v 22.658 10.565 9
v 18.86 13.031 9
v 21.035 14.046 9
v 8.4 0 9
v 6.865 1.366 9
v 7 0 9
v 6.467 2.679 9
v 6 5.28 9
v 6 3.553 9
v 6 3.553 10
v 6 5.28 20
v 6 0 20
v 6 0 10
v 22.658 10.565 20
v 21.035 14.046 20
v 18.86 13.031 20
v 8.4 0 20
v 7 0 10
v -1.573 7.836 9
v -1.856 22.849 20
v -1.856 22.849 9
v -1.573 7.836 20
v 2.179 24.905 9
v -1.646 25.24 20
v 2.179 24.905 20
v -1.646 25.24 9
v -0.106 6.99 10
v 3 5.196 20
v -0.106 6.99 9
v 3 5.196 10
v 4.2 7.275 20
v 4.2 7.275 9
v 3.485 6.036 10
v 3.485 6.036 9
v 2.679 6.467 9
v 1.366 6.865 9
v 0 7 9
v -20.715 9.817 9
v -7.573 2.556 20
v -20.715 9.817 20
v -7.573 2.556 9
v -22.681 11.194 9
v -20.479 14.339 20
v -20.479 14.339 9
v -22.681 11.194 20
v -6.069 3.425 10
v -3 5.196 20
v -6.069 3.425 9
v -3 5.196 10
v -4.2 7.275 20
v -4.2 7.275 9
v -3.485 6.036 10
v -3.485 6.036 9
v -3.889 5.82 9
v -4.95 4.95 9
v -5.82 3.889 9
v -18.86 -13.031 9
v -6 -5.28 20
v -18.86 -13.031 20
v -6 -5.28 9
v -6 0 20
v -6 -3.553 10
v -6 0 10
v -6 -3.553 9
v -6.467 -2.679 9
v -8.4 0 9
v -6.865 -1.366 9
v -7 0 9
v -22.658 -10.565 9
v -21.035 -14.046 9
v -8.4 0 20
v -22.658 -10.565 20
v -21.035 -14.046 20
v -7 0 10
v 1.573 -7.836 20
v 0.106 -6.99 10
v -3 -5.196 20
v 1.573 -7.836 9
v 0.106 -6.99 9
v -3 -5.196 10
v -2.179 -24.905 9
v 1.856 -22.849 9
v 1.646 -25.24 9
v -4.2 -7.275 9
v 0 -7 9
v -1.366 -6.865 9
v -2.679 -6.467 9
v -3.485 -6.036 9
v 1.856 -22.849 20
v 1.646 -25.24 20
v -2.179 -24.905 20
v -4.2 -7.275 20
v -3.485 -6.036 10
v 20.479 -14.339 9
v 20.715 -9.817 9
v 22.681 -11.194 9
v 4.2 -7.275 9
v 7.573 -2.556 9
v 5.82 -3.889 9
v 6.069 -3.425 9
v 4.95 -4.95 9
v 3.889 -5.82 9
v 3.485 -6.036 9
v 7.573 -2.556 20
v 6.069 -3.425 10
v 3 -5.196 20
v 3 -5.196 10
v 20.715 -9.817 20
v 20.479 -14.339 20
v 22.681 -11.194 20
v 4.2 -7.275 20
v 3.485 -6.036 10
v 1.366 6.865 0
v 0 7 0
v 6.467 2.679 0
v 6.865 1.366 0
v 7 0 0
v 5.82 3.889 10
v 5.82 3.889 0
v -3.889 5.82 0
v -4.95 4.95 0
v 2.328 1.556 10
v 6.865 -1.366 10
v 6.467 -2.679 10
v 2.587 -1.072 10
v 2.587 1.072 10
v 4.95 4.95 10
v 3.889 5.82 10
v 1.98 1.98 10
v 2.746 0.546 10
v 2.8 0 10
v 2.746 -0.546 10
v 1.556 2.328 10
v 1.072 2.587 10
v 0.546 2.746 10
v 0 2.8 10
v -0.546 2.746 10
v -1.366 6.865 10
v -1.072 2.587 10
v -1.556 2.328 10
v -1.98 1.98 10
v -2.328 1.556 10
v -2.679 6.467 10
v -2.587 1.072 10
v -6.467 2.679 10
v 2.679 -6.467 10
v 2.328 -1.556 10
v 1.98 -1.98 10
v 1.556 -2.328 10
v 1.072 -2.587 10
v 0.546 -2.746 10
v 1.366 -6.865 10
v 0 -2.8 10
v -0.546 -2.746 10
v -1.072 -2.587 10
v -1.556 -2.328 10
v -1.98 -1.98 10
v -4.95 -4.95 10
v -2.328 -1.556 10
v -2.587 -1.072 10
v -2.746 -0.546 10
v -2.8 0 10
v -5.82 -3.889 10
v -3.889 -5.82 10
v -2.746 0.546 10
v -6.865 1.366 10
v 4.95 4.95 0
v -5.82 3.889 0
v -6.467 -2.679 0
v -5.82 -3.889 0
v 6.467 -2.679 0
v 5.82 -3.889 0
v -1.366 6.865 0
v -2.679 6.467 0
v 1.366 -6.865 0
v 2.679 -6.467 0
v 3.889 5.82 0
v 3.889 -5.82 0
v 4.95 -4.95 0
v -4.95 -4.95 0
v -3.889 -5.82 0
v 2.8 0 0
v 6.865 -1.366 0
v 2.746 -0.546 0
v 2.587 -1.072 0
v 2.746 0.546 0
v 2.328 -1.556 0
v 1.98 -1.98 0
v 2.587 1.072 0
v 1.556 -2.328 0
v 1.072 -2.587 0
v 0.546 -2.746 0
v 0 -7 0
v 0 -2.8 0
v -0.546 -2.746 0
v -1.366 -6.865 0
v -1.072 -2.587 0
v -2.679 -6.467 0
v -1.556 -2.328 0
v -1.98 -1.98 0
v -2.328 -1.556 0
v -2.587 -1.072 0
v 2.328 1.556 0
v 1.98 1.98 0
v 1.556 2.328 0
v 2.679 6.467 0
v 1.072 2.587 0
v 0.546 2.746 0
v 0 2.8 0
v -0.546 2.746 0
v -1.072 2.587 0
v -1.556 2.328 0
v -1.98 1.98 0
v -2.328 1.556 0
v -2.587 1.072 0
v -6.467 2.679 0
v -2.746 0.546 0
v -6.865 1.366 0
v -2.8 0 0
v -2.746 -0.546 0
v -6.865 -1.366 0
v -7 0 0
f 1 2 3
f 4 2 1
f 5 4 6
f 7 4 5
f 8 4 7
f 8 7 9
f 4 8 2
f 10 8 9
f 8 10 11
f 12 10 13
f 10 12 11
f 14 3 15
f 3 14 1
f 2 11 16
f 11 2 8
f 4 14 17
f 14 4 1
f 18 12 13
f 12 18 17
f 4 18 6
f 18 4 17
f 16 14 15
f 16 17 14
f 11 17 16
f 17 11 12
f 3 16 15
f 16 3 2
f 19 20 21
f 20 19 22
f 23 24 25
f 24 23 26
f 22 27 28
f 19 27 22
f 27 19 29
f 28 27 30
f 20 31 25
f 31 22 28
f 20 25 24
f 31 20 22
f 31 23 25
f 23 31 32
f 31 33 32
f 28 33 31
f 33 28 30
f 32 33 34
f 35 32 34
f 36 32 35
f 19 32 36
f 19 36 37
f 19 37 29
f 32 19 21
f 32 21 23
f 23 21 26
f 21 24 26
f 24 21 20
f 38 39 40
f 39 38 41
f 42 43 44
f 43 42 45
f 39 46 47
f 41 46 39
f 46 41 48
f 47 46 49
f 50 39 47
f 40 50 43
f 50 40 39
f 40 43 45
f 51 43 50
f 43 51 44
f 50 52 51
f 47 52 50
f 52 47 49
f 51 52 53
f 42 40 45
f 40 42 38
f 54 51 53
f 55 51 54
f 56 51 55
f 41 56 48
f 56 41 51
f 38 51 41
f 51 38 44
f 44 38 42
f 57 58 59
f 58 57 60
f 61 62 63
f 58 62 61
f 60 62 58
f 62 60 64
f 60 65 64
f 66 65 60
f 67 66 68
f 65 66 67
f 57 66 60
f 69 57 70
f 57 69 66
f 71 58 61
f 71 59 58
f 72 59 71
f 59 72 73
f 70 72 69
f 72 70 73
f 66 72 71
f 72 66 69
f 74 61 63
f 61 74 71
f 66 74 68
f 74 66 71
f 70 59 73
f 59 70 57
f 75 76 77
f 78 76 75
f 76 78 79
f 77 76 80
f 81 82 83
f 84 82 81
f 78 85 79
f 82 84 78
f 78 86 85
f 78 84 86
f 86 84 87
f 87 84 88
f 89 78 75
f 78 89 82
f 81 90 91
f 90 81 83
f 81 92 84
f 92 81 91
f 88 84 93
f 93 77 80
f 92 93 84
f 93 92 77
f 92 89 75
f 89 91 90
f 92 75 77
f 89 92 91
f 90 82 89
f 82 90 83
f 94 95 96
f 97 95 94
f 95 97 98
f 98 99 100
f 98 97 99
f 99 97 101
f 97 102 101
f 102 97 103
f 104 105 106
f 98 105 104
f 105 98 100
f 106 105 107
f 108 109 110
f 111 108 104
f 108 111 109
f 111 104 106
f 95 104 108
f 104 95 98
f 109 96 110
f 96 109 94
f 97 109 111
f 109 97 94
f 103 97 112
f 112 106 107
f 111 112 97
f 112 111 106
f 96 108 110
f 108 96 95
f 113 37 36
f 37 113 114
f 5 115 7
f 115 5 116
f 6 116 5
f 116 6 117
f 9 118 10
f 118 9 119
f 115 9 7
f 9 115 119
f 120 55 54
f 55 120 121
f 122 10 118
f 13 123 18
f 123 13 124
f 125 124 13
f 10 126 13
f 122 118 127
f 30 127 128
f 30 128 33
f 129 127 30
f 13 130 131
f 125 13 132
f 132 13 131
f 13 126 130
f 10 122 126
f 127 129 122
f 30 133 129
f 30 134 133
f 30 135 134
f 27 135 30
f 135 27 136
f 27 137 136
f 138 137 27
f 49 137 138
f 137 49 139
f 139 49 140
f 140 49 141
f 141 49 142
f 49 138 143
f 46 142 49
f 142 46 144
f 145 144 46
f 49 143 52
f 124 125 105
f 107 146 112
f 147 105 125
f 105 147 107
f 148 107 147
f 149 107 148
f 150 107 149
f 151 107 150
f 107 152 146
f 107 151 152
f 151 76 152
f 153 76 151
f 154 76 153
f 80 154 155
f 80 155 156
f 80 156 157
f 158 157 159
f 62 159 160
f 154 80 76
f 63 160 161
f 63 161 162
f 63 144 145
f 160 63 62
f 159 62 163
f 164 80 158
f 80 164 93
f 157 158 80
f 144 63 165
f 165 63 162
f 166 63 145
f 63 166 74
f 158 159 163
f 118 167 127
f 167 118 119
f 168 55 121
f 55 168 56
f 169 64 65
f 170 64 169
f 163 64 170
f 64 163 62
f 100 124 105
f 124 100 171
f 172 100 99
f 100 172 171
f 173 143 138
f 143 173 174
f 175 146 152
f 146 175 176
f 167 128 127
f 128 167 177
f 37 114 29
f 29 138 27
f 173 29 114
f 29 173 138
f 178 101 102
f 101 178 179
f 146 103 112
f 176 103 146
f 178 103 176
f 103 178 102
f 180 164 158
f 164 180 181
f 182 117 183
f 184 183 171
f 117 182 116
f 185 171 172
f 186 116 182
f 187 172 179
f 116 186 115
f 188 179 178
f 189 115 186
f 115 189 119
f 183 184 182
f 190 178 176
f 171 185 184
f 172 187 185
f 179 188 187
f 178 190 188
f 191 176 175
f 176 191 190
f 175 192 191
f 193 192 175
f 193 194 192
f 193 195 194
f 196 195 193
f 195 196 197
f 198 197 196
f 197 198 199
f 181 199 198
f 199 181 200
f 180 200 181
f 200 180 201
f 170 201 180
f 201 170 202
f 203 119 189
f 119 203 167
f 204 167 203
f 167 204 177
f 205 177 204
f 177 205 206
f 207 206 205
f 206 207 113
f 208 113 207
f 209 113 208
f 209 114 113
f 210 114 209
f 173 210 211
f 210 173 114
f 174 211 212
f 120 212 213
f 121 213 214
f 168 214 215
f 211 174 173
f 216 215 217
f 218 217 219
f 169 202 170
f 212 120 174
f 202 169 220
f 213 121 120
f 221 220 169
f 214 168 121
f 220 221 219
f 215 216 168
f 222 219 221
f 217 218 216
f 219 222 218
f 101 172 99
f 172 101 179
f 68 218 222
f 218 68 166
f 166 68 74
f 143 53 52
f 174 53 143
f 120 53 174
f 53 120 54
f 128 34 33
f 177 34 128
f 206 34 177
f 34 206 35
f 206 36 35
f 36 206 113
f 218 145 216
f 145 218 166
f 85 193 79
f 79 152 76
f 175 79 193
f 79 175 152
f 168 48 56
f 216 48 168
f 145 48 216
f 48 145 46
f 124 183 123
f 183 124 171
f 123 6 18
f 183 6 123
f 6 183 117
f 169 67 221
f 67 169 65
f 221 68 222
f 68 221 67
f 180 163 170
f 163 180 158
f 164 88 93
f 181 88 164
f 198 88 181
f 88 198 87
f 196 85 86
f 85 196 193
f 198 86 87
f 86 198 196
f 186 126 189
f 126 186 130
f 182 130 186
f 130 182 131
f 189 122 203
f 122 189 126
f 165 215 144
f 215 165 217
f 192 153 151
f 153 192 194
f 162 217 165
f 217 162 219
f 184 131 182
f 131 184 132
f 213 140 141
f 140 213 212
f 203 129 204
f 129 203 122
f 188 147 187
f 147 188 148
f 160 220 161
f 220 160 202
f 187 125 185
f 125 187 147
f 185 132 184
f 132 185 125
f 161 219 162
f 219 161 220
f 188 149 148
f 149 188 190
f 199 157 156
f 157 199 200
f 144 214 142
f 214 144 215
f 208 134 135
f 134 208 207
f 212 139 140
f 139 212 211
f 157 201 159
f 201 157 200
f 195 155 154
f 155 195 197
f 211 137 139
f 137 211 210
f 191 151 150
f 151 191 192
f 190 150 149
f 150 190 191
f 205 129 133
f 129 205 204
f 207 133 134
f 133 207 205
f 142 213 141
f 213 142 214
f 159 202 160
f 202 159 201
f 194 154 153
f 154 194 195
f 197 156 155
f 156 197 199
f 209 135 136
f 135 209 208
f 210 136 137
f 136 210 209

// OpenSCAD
$fn = 32;

// ----------------------------------------------------------------------
// Impeller: 50 mm, 6 blades, 20 mm tall
// ----------------------------------------------------------------------

// --- parameters (mm) ---
center_d = 14;            // hub diameter
center_h = 10;            // hub height
wheel_d = 50;             // outer diameter over the blades
blade_count = 6;          // number of blades
blade_t = 2.4;            // blade thickness
blade_h = 10;             // blade height
blade_in_r = 6;           // blade root radius
blade_out_r = 22.6;       // blade tip radius
sweep = 25;               // blade sweep, degrees
bore_d = 5.6;             // shaft bore

module hub() {
  cylinder(h = center_h, d = center_d);
}

module blade() {
  /* blade swept between two boxes: hull of the root and the tip section */
  hull() {
    translate([blade_in_r, 0, center_h - 1])
      cube([blade_t, blade_t * 2.2, blade_h + 1], center = false);
    rotate([0, 0, sweep])
      translate([blade_out_r, 0, center_h - 1])
        cube([blade_t, blade_t * 1.6, blade_h + 1], center = false);
  }
}

module blades() {
  for (i = [0 : blade_count - 1])
    rotate([0, 0, i * 360 / blade_count]) blade();
}

difference() {
  union() {
    hub();
    blades();
  }
  translate([0, 0, -1]) cylinder(h = center_h + blade_h + 0 + 3, d = bore_d);
}
